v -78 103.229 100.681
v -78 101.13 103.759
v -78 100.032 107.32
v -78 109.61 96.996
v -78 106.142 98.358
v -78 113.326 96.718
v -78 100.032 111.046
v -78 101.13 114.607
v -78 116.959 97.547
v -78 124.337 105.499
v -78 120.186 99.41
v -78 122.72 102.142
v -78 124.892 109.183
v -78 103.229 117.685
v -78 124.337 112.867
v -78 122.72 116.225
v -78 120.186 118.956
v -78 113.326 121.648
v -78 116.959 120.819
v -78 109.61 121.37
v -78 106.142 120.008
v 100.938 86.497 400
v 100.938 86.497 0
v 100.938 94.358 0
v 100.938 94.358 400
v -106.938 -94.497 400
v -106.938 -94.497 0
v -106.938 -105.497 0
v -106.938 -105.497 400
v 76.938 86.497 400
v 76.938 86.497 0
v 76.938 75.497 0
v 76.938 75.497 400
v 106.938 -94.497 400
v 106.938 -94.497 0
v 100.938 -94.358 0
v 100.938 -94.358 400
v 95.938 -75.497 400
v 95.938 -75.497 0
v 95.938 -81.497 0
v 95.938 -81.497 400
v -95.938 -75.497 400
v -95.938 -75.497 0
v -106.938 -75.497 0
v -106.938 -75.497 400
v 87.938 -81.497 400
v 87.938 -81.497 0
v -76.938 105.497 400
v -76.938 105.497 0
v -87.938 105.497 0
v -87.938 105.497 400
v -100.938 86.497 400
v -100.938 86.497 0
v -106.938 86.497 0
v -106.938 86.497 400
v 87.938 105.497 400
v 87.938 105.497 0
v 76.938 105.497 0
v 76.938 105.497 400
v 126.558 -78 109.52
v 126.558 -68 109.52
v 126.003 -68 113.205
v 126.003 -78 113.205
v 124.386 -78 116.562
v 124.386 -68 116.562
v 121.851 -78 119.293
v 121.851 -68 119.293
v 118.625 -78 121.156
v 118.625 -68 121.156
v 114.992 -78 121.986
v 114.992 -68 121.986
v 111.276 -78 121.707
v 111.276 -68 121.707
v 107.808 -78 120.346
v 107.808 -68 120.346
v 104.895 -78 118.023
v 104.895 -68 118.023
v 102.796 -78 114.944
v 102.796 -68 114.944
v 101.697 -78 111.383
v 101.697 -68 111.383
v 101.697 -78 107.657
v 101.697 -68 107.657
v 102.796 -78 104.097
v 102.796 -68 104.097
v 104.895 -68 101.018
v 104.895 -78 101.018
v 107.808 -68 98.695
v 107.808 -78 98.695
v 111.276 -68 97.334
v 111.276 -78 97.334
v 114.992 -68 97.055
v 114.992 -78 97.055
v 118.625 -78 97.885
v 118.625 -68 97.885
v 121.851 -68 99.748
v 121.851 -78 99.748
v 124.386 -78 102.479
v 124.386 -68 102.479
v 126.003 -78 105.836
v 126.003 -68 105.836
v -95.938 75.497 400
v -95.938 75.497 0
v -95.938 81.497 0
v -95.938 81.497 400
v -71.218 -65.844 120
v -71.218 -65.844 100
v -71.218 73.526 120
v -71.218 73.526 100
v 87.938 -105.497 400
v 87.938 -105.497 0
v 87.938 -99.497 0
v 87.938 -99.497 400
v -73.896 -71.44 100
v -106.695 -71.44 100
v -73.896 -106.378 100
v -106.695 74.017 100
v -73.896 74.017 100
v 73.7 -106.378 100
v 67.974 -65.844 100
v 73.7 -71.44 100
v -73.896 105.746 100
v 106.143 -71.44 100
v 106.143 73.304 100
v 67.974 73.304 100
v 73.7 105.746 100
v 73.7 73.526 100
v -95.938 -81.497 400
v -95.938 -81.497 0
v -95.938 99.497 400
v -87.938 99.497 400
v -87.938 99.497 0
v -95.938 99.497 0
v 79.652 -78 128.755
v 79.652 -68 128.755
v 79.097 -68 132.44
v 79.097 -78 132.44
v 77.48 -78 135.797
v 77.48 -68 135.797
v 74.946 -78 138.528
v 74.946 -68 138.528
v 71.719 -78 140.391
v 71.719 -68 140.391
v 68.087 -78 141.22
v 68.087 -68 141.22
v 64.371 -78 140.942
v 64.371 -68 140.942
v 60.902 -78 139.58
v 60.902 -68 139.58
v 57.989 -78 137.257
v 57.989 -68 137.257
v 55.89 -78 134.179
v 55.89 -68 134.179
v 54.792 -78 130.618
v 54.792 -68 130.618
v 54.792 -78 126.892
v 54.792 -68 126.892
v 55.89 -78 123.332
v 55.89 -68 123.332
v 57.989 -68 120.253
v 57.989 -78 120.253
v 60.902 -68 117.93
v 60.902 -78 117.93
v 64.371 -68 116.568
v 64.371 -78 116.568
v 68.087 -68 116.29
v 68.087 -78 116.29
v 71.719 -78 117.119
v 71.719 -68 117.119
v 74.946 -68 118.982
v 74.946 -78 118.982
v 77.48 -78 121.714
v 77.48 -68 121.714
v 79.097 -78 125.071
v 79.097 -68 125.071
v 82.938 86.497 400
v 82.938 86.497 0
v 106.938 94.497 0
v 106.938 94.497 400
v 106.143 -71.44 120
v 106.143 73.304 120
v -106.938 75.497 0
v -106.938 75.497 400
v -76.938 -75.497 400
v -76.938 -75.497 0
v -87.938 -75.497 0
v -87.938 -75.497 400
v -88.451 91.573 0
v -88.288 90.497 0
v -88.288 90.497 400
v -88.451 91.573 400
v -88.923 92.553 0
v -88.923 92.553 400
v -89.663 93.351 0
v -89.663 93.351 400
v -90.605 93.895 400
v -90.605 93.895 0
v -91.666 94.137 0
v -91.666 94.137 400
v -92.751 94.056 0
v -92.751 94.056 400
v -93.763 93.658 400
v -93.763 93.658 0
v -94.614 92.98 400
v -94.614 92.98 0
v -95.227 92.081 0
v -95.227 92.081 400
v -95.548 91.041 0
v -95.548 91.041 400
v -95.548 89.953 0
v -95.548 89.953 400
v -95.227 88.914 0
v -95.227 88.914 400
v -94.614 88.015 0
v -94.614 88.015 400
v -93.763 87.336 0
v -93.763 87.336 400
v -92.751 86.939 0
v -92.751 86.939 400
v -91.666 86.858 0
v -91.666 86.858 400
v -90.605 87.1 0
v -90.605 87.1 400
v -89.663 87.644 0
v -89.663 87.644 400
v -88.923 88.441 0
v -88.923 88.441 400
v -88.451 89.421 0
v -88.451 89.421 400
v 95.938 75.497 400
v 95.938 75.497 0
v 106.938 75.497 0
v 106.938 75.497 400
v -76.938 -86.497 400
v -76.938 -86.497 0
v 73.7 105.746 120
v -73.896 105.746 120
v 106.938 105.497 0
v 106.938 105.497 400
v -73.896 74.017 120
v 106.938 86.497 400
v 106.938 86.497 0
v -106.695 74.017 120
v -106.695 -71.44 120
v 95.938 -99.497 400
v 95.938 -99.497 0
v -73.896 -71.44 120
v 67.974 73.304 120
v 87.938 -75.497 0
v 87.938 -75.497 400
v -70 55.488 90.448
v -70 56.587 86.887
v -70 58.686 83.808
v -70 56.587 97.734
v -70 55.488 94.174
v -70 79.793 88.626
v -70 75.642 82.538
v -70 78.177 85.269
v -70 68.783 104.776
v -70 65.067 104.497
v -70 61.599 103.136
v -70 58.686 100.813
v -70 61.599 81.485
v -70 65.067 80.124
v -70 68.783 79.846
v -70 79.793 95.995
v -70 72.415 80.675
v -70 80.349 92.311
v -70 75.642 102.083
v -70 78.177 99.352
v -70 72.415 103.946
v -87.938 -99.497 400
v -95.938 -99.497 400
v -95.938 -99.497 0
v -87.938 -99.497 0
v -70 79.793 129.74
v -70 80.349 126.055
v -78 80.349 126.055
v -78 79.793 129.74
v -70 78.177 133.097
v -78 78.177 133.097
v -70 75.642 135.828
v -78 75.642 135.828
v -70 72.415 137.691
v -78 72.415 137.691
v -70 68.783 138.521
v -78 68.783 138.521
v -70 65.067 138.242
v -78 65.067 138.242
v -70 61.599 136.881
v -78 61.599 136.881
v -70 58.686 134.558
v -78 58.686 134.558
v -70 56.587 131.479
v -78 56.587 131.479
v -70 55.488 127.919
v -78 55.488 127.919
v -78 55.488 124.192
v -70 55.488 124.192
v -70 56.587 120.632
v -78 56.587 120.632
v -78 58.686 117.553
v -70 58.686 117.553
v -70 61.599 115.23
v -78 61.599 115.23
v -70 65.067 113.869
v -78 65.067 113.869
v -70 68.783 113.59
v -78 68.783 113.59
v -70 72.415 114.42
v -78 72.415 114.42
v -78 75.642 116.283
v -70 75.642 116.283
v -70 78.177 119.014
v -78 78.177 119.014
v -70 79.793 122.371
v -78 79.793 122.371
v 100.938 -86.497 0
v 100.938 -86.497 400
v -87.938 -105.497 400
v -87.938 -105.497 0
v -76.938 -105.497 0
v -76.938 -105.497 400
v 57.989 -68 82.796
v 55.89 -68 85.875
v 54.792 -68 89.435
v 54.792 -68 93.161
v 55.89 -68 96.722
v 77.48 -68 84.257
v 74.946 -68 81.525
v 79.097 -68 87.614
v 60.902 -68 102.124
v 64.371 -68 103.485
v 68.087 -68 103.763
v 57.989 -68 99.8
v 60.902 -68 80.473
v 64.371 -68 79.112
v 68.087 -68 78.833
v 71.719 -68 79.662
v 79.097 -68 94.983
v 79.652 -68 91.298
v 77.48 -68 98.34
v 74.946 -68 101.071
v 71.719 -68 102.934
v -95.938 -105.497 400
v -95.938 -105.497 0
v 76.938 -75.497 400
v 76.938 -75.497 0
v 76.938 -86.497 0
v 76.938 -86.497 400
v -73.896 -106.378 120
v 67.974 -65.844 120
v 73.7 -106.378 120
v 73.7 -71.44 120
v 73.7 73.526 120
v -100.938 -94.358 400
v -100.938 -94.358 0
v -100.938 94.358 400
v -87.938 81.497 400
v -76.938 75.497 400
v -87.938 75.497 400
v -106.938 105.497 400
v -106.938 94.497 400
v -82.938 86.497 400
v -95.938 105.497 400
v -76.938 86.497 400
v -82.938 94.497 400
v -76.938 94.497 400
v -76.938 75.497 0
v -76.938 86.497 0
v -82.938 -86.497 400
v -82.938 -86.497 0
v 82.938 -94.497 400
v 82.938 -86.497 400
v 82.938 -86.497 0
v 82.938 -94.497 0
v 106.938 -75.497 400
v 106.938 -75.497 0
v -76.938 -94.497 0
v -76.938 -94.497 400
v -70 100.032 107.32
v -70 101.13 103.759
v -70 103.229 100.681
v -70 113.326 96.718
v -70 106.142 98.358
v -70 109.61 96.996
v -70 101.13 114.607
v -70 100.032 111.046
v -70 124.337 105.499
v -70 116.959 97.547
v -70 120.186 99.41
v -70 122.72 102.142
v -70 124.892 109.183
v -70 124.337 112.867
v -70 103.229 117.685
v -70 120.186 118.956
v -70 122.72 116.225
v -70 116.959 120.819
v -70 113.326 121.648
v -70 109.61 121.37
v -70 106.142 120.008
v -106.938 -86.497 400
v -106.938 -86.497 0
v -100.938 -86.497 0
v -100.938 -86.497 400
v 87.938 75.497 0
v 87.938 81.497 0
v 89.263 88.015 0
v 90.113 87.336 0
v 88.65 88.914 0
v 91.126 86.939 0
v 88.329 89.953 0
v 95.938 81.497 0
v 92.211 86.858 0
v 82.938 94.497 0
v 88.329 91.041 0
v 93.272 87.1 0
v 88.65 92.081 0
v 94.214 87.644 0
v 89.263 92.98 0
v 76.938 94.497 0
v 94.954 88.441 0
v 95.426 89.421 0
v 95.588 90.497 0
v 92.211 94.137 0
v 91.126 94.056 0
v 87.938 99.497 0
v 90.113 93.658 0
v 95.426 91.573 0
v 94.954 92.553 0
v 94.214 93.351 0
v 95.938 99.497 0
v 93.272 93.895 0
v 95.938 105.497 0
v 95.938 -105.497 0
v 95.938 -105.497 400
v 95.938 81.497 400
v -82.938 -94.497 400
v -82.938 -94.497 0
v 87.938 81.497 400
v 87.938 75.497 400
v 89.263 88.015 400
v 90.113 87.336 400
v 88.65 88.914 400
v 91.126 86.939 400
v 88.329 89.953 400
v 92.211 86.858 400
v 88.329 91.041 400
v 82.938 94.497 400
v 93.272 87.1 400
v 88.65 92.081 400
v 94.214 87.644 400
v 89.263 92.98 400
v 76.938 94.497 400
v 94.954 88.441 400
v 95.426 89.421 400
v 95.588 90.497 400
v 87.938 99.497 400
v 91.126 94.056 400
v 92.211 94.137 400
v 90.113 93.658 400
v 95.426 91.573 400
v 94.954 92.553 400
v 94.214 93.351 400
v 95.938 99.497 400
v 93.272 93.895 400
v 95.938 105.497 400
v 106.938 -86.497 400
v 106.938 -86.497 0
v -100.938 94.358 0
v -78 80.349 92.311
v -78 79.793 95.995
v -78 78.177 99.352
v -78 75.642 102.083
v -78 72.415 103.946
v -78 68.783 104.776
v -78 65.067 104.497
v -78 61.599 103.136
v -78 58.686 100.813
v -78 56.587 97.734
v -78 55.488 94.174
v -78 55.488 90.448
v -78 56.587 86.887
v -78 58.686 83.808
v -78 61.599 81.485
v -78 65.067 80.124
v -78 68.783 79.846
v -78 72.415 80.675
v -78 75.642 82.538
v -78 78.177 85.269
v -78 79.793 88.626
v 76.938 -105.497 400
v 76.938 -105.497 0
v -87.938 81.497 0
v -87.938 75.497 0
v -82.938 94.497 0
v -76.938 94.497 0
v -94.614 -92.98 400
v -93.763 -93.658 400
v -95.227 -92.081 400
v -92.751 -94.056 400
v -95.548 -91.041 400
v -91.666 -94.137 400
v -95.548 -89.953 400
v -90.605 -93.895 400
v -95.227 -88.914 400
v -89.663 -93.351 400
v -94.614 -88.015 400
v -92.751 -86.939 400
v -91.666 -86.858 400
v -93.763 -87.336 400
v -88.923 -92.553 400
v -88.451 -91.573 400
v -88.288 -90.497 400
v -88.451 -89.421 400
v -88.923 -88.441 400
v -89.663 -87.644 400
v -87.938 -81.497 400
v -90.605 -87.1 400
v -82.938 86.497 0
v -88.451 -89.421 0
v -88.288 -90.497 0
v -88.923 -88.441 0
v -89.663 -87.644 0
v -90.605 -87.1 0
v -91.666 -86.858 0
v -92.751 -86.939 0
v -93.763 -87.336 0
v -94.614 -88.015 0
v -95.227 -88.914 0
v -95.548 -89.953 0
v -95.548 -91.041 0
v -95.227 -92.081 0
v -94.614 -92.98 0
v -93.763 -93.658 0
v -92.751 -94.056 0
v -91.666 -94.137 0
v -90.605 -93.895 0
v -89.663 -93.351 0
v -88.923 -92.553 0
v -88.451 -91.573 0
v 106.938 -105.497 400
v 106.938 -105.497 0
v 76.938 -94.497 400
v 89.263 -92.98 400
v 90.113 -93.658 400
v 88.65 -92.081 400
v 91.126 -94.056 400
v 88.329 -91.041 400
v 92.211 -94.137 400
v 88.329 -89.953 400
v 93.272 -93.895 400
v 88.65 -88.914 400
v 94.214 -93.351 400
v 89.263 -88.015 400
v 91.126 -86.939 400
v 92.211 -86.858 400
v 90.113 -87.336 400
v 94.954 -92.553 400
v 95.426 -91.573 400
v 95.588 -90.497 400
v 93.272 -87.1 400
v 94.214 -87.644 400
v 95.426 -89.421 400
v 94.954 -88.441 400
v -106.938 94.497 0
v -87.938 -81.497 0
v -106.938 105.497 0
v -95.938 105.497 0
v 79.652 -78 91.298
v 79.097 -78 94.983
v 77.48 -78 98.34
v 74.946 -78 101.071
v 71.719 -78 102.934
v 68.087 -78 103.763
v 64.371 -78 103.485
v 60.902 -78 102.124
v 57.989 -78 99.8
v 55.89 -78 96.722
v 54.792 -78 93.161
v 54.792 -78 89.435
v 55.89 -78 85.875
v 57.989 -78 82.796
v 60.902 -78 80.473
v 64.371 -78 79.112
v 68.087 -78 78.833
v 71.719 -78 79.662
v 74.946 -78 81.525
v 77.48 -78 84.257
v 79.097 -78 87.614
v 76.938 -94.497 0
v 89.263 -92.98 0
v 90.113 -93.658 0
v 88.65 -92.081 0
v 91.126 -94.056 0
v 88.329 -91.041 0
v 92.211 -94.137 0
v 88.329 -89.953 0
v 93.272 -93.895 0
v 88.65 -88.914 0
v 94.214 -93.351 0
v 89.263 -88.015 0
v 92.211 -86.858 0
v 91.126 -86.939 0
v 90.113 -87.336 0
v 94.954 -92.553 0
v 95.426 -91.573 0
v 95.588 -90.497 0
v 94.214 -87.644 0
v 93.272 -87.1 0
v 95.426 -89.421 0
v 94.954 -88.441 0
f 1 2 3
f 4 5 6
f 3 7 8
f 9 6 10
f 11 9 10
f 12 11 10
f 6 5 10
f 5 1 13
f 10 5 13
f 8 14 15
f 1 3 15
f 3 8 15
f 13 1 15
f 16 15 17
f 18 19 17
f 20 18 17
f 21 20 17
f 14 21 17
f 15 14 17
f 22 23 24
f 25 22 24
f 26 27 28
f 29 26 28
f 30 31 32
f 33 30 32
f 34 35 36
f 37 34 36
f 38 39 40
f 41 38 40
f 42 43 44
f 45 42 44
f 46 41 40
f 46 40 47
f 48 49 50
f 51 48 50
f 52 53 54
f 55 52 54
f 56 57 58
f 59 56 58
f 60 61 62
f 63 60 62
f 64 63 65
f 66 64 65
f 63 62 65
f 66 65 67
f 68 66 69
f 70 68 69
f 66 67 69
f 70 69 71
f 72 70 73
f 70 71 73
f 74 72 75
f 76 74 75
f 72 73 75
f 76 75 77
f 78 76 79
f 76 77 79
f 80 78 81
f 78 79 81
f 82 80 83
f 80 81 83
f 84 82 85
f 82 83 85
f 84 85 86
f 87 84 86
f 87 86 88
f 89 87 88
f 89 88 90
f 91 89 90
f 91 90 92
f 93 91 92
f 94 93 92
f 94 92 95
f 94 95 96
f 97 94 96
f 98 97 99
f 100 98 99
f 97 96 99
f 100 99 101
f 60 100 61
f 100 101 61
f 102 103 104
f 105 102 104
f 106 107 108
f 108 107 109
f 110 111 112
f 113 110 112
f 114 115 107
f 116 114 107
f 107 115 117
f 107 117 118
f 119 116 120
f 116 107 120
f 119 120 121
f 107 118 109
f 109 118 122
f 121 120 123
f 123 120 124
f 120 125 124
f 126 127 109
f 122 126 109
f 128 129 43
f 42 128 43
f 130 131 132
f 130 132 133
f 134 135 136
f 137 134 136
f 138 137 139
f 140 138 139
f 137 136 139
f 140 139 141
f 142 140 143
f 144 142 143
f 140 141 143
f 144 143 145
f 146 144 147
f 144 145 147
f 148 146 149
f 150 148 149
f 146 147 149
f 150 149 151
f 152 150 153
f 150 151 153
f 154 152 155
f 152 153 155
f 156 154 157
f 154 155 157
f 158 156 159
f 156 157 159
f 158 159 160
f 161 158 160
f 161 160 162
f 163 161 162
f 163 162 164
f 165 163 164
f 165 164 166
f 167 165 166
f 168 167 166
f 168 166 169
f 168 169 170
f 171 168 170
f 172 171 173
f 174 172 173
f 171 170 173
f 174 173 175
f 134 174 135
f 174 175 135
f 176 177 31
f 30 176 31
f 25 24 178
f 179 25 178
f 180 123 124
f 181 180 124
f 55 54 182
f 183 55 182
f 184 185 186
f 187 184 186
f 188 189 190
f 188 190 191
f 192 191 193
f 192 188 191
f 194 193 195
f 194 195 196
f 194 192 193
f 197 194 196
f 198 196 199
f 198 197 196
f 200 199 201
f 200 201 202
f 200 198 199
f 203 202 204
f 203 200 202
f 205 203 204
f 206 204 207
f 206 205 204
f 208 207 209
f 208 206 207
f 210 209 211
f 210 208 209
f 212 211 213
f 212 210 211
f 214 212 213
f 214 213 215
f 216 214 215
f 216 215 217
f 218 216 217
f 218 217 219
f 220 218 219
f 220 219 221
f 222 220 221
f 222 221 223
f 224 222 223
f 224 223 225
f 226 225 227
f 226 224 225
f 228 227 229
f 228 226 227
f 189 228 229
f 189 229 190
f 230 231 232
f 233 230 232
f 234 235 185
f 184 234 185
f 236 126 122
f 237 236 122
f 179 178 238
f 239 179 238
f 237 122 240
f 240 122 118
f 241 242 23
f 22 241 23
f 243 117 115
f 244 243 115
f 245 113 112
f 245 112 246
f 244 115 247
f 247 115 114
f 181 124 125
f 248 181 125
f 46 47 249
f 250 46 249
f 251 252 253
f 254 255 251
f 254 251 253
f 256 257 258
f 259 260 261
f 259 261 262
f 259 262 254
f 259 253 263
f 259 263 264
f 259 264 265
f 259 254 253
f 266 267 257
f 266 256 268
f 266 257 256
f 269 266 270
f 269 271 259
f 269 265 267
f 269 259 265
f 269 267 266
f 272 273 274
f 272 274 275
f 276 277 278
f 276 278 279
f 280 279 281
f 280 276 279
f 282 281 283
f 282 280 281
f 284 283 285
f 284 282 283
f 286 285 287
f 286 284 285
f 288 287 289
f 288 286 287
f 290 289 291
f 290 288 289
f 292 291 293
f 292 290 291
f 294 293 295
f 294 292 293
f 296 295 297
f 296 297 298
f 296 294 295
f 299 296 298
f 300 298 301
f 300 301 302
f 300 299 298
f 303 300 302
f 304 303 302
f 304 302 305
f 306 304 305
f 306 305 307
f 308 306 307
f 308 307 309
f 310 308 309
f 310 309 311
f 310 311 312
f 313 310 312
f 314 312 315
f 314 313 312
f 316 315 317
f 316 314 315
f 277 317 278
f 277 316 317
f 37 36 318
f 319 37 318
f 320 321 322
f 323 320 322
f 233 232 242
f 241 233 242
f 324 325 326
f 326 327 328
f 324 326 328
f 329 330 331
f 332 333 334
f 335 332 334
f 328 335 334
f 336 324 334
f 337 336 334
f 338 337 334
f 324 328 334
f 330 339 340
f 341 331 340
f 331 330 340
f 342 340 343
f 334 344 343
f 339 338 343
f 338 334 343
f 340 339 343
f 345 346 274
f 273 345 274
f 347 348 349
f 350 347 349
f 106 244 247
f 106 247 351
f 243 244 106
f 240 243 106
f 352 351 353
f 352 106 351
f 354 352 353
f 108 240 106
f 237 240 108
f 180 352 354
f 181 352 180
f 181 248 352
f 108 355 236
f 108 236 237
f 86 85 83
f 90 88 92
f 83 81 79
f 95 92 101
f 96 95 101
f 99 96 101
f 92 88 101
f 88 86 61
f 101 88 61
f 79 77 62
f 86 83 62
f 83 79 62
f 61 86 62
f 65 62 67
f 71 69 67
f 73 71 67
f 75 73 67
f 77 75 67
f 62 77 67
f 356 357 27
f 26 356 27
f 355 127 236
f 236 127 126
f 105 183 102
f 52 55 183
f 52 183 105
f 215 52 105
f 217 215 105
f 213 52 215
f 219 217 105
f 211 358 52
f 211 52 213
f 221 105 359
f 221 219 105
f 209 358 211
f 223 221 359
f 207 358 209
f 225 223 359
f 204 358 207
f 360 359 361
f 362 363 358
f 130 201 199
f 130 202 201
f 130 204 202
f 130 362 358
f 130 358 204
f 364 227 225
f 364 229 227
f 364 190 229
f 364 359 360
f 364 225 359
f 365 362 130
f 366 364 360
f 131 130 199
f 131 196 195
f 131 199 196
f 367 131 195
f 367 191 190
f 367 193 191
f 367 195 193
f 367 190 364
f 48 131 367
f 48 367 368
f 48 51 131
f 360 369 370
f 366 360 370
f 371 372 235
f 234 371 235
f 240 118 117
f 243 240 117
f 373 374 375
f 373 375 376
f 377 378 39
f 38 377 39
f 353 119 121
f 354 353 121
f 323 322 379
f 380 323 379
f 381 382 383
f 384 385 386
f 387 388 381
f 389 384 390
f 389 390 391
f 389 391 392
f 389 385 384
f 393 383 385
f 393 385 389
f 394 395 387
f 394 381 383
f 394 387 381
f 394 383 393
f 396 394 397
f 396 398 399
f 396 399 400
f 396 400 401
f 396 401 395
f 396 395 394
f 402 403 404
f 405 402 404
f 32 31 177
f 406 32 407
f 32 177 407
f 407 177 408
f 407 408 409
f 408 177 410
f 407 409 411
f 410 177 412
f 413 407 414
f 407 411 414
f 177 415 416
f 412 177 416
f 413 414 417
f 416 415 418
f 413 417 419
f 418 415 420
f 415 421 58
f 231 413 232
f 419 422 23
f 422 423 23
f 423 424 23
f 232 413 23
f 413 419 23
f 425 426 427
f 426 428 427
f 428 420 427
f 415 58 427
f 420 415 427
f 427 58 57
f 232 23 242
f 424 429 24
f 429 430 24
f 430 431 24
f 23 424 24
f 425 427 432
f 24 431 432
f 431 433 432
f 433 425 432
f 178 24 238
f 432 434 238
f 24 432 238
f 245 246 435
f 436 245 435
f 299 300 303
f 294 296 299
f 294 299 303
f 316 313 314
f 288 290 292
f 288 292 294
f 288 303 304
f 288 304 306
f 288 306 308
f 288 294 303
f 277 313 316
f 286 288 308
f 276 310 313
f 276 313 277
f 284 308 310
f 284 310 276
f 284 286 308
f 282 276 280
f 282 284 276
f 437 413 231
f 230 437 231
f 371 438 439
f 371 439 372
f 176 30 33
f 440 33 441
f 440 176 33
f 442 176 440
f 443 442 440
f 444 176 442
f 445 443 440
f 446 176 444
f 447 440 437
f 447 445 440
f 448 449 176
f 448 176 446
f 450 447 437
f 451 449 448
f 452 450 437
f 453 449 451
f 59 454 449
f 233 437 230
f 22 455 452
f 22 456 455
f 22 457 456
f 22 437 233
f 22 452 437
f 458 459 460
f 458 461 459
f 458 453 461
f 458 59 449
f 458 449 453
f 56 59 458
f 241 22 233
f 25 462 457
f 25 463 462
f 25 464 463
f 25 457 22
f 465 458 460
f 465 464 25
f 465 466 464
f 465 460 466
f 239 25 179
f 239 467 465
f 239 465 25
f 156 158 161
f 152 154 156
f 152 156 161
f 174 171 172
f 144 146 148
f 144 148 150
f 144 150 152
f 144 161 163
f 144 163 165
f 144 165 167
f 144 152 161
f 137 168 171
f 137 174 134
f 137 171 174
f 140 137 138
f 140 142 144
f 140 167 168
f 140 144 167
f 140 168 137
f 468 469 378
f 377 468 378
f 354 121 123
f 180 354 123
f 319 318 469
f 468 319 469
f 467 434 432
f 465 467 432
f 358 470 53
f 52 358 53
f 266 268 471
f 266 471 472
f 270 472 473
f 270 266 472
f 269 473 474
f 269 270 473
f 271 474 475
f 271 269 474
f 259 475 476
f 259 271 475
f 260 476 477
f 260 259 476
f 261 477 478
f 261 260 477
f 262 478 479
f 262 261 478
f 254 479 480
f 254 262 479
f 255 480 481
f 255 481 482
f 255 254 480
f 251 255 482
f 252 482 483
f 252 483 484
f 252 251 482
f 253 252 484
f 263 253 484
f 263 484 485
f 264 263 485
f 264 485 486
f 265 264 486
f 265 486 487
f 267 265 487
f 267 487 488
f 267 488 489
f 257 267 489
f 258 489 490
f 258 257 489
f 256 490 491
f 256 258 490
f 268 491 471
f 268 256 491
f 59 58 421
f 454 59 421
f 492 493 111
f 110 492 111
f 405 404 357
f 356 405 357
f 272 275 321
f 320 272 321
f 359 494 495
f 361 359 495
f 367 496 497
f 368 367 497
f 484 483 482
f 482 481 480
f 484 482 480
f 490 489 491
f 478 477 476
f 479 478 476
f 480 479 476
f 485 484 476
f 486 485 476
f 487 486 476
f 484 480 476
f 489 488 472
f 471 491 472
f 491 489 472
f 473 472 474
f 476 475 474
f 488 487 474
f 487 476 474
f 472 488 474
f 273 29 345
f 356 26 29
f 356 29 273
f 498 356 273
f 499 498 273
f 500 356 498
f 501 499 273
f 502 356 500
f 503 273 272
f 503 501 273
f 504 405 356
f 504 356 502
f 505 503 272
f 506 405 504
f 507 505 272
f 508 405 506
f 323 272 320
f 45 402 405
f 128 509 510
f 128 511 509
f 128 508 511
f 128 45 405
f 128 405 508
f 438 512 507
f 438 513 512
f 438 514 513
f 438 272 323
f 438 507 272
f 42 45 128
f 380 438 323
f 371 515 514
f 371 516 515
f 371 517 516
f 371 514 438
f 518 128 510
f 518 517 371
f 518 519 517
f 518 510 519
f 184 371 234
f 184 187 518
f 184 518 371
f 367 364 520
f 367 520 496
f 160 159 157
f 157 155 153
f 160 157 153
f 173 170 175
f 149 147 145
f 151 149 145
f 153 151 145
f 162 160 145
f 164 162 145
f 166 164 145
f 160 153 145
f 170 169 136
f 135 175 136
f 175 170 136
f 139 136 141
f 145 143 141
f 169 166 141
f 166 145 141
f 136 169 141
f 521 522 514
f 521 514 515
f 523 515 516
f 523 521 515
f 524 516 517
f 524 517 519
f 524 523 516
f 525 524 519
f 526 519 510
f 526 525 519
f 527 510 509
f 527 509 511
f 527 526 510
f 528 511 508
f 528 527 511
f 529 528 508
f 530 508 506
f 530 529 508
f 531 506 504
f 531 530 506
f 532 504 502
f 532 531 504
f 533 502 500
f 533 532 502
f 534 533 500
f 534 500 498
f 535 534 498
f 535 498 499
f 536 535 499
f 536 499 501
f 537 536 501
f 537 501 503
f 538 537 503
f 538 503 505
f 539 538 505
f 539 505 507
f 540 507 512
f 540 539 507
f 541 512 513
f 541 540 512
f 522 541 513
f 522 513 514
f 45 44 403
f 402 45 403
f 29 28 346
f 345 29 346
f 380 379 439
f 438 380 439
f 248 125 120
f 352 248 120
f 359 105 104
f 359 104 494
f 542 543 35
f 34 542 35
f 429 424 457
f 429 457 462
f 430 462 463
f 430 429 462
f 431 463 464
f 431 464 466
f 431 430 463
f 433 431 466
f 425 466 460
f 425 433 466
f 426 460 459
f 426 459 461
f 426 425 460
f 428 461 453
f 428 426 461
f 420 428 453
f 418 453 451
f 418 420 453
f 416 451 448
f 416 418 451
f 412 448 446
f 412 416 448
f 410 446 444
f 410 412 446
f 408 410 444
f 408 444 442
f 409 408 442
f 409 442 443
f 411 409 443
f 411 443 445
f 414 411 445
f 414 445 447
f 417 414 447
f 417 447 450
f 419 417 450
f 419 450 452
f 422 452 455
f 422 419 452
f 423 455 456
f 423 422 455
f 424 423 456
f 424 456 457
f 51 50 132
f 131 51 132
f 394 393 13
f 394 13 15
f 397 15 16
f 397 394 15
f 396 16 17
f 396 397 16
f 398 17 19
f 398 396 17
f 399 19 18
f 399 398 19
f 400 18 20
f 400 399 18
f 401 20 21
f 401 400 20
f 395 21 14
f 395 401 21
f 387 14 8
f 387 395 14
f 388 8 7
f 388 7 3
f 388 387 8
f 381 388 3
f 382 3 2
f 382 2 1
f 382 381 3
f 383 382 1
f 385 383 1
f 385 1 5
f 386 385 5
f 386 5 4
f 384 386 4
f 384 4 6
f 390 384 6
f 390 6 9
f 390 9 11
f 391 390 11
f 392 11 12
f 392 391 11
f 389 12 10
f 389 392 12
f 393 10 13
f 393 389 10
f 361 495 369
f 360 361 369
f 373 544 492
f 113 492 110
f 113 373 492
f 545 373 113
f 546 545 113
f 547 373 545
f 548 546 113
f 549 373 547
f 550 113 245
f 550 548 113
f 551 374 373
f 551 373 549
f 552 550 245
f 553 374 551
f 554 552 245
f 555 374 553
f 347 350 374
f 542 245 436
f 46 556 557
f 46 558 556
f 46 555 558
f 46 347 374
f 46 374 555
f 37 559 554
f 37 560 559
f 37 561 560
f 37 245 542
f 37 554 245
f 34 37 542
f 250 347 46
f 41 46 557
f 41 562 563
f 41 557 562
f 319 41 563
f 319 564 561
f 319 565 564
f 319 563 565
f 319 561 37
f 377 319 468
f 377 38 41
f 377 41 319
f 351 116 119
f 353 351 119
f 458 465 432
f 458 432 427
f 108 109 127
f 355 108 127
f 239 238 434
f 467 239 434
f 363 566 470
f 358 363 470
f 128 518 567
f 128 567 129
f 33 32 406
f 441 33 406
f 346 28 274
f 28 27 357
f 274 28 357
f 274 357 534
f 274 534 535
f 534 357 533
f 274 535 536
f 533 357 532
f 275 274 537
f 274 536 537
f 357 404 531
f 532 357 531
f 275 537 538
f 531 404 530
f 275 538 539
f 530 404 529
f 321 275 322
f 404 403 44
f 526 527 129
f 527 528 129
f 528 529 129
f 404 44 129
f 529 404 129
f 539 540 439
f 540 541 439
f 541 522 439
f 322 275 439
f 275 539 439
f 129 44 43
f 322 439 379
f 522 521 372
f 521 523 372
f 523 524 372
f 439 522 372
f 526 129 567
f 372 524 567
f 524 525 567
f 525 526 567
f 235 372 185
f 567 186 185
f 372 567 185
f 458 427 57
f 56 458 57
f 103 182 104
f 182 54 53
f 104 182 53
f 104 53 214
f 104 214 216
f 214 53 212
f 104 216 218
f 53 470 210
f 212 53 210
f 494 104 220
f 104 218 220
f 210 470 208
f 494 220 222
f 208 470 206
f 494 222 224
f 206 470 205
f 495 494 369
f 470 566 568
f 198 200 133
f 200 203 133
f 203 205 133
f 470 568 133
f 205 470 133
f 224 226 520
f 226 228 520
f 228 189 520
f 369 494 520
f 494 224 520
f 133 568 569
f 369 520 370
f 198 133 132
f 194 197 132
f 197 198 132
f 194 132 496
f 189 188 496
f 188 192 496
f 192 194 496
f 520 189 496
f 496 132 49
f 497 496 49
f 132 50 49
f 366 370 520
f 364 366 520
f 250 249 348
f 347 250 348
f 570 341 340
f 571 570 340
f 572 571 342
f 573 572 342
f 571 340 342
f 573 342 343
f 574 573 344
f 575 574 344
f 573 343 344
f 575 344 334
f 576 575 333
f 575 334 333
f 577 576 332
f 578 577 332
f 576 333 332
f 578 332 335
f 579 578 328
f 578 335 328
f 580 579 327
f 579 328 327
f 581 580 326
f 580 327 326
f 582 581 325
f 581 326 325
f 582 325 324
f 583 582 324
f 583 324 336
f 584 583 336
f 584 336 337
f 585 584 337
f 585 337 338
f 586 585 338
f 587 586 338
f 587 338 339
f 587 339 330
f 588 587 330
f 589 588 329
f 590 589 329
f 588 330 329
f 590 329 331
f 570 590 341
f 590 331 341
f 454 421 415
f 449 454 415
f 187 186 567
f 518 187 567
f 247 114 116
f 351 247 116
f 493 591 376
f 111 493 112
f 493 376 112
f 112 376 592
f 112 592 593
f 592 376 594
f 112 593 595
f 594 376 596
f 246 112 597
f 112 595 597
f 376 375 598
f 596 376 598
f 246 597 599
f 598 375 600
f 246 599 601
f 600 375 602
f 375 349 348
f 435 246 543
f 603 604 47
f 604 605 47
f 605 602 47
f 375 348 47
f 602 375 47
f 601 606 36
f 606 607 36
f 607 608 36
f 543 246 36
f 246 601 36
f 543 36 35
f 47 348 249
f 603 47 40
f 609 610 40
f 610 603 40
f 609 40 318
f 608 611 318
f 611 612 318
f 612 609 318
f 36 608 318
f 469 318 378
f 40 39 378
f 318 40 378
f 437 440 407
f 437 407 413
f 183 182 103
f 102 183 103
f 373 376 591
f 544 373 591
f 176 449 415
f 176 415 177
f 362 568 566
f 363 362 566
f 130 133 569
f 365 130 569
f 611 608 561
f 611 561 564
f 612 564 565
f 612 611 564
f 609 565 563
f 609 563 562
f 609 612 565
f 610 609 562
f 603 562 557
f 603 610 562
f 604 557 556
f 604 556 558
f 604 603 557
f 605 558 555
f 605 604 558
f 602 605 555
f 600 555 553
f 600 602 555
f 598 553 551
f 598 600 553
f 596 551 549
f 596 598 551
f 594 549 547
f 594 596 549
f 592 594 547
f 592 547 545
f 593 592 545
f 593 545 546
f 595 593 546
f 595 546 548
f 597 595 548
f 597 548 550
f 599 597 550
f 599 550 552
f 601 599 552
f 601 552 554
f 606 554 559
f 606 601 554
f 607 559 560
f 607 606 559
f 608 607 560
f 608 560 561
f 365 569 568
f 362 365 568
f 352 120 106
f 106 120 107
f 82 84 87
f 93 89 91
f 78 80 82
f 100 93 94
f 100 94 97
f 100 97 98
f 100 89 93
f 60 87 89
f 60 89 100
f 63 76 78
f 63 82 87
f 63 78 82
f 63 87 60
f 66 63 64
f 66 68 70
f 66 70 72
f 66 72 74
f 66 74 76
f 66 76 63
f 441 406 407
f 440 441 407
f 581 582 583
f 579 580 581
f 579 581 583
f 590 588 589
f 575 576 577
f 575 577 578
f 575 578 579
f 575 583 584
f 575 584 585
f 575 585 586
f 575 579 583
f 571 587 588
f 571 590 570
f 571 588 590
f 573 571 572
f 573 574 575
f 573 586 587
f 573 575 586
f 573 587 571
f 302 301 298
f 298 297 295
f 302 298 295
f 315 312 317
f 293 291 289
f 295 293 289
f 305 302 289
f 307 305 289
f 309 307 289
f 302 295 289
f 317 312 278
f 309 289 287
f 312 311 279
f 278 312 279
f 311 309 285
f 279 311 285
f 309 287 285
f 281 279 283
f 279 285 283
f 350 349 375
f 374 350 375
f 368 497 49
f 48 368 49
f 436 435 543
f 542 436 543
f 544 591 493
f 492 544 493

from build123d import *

# Parameters (mm, degrees)
F0_R     = 3.65
F1_DEPTH = 400
F3_START = 100
F2_W     = 5.726531148
F2_H     = 5.5962726474
F2_W_2   = 2.6776865125
F2_H_2   = 0.4904717207
F3_DEPTH = 20
F5_START = 68
F4_R     = 12.5
F5_DEPTH = 10
F7_START = -70
F6_R     = 12.5
F7_DEPTH = 8


with BuildPart() as f1:
    # F0 (on Top) → F1 (new body)
    with BuildSketch(Plane.XY):
        Polygon((100.9384279847, -99.4972968996), (95.9384279847, -99.4972968996), (95.9384279847, -105.4972968996), (106.9384279847, -105.4972968996), (106.9384279847, -94.4972968996), (100.9384279847, -94.3576920501), align=None)
        Polygon((76.9384279847, -105.4972968996), (87.9384279847, -105.4972968996), (87.9384279847, -99.4972968996), (82.9384279847, -99.4972968996), (82.9384279847, -94.4972968996), (76.9384279847, -94.4972968996), align=None)
        Polygon((82.9384279847, -99.4972968996), (87.9384279847, -99.4972968996), (95.9384279847, -99.4972968996), (100.9384279847, -99.4972968996), (100.9384279847, -94.3576920501), (100.9384279847, -86.4972968996), (100.9384279847, -81.4972968996), (95.9384279847, -81.4972968996), (87.9384279847, -81.4972968996), (82.9384279847, -81.4972968996), (82.9384279847, -86.4972968996), (82.9384279847, -94.4972968996), align=None)
        with Locations((91.9384279847, -90.4972968996)):
            Circle(F0_R, mode=Mode.SUBTRACT)
        Polygon((100.9384279847, -81.4972968996), (100.9384279847, -86.4972968996), (106.9384279847, -86.4972968996), (106.9384279847, -75.4972968996), (95.9384279847, -75.4972968996), (95.9384279847, -81.4972968996), align=None)
        Polygon((76.9384279847, -86.4972968996), (82.9384279847, -86.4972968996), (82.9384279847, -81.4972968996), (87.9384279847, -81.4972968996), (87.9384279847, -75.4972968996), (76.9384279847, -75.4972968996), align=None)
    extrude(amount=F1_DEPTH)


with BuildPart() as f1b:
    # F0 (on Top) → F1, piece 2 (new body)
    with BuildSketch(Plane.XY):
        Polygon((87.9384279847, 81.4972968996), (95.9384279847, 81.4972968996), (100.9384279847, 81.4972968996), (100.9384279847, 86.4972968996), (100.9384279847, 94.3576920501), (100.9384279847, 99.4972968996), (95.9384279847, 99.4972968996), (87.9384279847, 99.4972968996), (82.9384279847, 99.4972968996), (82.9384279847, 94.4972968996), (82.9384279847, 86.4972968996), (82.9384279847, 81.4972968996), align=None)
        with Locations((91.9384279847, 90.4972968996)):
            Circle(F0_R, mode=Mode.SUBTRACT)
        Polygon((100.9384279847, 99.4972968996), (100.9384279847, 94.3576920501), (106.9384279847, 94.4972968996), (106.9384279847, 105.4972968996), (95.9384279847, 105.4972968996), (95.9384279847, 99.4972968996), align=None)
        Polygon((87.9384279847, 75.4972968996), (87.9384279847, 81.4972968996), (82.9384279847, 81.4972968996), (82.9384279847, 86.4972968996), (76.9384279847, 86.4972968996), (76.9384279847, 75.4972968996), align=None)
        Polygon((95.9384279847, 75.4972968996), (106.9384279847, 75.4972968996), (106.9384279847, 86.4972968996), (100.9384279847, 86.4972968996), (100.9384279847, 81.4972968996), (95.9384279847, 81.4972968996), align=None)
        Polygon((76.9384279847, 94.4972968996), (82.9384279847, 94.4972968996), (82.9384279847, 99.4972968996), (87.9384279847, 99.4972968996), (87.9384279847, 105.4972968996), (76.9384279847, 105.4972968996), align=None)
    extrude(amount=F1_DEPTH)


with BuildPart() as f1c:
    # F0 (on Top) → F1, piece 3 (new body)
    with BuildSketch(Plane.XY):
        Polygon((-100.9384279847, -99.4972968996), (-100.9384279847, -94.3576920501), (-106.9384279847, -94.4972968996), (-106.9384279847, -105.4972968996), (-95.9384279847, -105.4972968996), (-95.9384279847, -99.4972968996), align=None)
        Polygon((-106.9384279847, -86.4972968996), (-100.9384279847, -86.4972968996), (-100.9384279847, -81.4972968996), (-95.9384279847, -81.4972968996), (-95.9384279847, -75.4972968996), (-106.9384279847, -75.4972968996), align=None)
        Polygon((-87.9384279847, -75.4972968996), (-87.9384279847, -81.4972968996), (-82.9384279847, -81.4972968996), (-82.9384279847, -86.4972968996), (-76.9384279847, -86.4972968996), (-76.9384279847, -75.4972968996), align=None)
        Polygon((-82.9384279847, -99.4972968996), (-87.9384279847, -99.4972968996), (-87.9384279847, -105.4972968996), (-76.9384279847, -105.4972968996), (-76.9384279847, -94.4972968996), (-82.9384279847, -94.4972968996), align=None)
        Polygon((-100.9384279847, -86.4972968996), (-100.9384279847, -94.3576920501), (-100.9384279847, -99.4972968996), (-95.9384279847, -99.4972968996), (-87.9384279847, -99.4972968996), (-82.9384279847, -99.4972968996), (-82.9384279847, -94.4972968996), (-82.9384279847, -86.4972968996), (-82.9384279847, -81.4972968996), (-87.9384279847, -81.4972968996), (-95.9384279847, -81.4972968996), (-100.9384279847, -81.4972968996), align=None)
        with Locations((-91.9384279847, -90.4972968996)):
            Circle(F0_R, mode=Mode.SUBTRACT)
    extrude(amount=F1_DEPTH)


with BuildPart() as f1d:
    # F0 (on Top) → F1, piece 4 (new body)
    with BuildSketch(Plane.XY):
        Polygon((-106.9384279847, 94.4972968996), (-100.9384279847, 94.3576920501), (-100.9384279847, 99.4972968996), (-95.9384279847, 99.4972968996), (-95.9384279847, 105.4972968996), (-106.9384279847, 105.4972968996), align=None)
        Polygon((-95.9384279847, 75.4972968996), (-95.9384279847, 81.4972968996), (-100.9384279847, 81.4972968996), (-100.9384279847, 86.4972968996), (-106.9384279847, 86.4972968996), (-106.9384279847, 75.4972968996), align=None)
        Polygon((-82.9384279847, 86.4972968996), (-82.9384279847, 81.4972968996), (-87.9384279847, 81.4972968996), (-87.9384279847, 75.4972968996), (-76.9384279847, 75.4972968996), (-76.9384279847, 86.4972968996), align=None)
        Polygon((-82.9384279847, 99.4972968996), (-82.9384279847, 94.4972968996), (-76.9384279847, 94.4972968996), (-76.9384279847, 105.4972968996), (-87.9384279847, 105.4972968996), (-87.9384279847, 99.4972968996), align=None)
        Polygon((-87.9384279847, 81.4972968996), (-82.9384279847, 81.4972968996), (-82.9384279847, 86.4972968996), (-82.9384279847, 94.4972968996), (-82.9384279847, 99.4972968996), (-87.9384279847, 99.4972968996), (-95.9384279847, 99.4972968996), (-100.9384279847, 99.4972968996), (-100.9384279847, 94.3576920501), (-100.9384279847, 86.4972968996), (-100.9384279847, 81.4972968996), (-95.9384279847, 81.4972968996), align=None)
        with Locations((-91.9384279847, 90.4972968996)):
            Circle(F0_R, mode=Mode.SUBTRACT)
    extrude(amount=F1_DEPTH)


with BuildPart() as f3:
    # F2 (on Top) → F3 (new body)
    with BuildSketch(Plane.XY.offset(F3_START)):
        Polygon((106.1426028609, 73.3035877347), (67.9735094309, 73.3035877347), (67.9735094309, -65.8438652754), (73.7000405788, -65.8438652754), (73.7000405788, -71.4401379228), (106.1426028609, -71.4401379228), align=None)
        with Locations((70.8367750049, -68.6420015991)):
            Rectangle(F2_W, F2_H)
        Polygon((67.9735094309, -71.4401379228), (67.9735094309, -65.8438652754), (-71.2180808187, -65.8438652754), (-71.2180808187, -71.4401379228), (-73.8957673311, -71.4401379228), (-73.8957673311, -106.3782721758), (73.7000405788, -106.3782721758), (73.7000405788, -71.4401379228), align=None)
        Polygon((-73.8957673311, -65.8438652754), (-71.2180808187, -65.8438652754), (-71.2180808187, 73.5261365771), (-73.8957673311, 73.5261365771), (-73.8957673311, 74.0166082978), (-106.6948398948, 74.0166082978), (-106.6948398948, -71.4401379228), (-73.8957673311, -71.4401379228), align=None)
        with Locations((-72.5569240749, -68.6420015991)):
            Rectangle(F2_W_2, F2_H)
        with Locations((-72.5569240749, 73.7713724375)):
            Rectangle(F2_W_2, F2_H_2)
        Polygon((-71.2180808187, 74.0166082978), (-71.2180808187, 73.5261365771), (73.7000405788, 73.5261365771), (73.7000405788, 105.7461425662), (-73.8957673311, 105.7461425662), (-73.8957673311, 74.0166082978), align=None)
    extrude(amount=F3_DEPTH)


with BuildPart() as f5:
    # F4 (on Front) → F5 (new body)
    with BuildSketch(Plane.XZ.offset(F5_START)):
        with Locations((67.152403295, 128.7550777197)):
            Circle(F4_R)
    extrude(amount=F5_DEPTH)


with BuildPart() as f5b:
    # F4 (on Front) → F5, piece 2 (new body)
    with BuildSketch(Plane.XZ.offset(F5_START)):
        with Locations((67.152403295, 91.2982076406)):
            Circle(F4_R)
    extrude(amount=F5_DEPTH)


with BuildPart() as f5c:
    # F4 (on Front) → F5, piece 3 (new body)
    with BuildSketch(Plane.XZ.offset(F5_START)):
        with Locations((114.0578463674, 109.5204651356)):
            Circle(F4_R)
    extrude(amount=F5_DEPTH)


with BuildPart() as f7:
    # F6 (on Right) → F7 (new body)
    with BuildSketch(Plane.YZ.offset(F7_START)):
        with Locations((67.8486824036, 126.0554790497)):
            Circle(F6_R)
    extrude(amount=-F7_DEPTH)


with BuildPart() as f7b:
    # F6 (on Right) → F7, piece 2 (new body)
    with BuildSketch(Plane.YZ.offset(F7_START)):
        with Locations((67.8486824036, 92.3105552793)):
            Circle(F6_R)
    extrude(amount=-F7_DEPTH)


with BuildPart() as f7c:
    # F6 (on Right) → F7, piece 3 (new body)
    with BuildSketch(Plane.YZ.offset(F7_START)):
        with Locations((112.3919859529, 109.1830134392)):
            Circle(F6_R)
    extrude(amount=-F7_DEPTH)


solid = Compound([f1.part, f1b.part, f1c.part, f1d.part, f3.part, f5.part, f5b.part, f5c.part, f7.part, f7b.part, f7c.part])
